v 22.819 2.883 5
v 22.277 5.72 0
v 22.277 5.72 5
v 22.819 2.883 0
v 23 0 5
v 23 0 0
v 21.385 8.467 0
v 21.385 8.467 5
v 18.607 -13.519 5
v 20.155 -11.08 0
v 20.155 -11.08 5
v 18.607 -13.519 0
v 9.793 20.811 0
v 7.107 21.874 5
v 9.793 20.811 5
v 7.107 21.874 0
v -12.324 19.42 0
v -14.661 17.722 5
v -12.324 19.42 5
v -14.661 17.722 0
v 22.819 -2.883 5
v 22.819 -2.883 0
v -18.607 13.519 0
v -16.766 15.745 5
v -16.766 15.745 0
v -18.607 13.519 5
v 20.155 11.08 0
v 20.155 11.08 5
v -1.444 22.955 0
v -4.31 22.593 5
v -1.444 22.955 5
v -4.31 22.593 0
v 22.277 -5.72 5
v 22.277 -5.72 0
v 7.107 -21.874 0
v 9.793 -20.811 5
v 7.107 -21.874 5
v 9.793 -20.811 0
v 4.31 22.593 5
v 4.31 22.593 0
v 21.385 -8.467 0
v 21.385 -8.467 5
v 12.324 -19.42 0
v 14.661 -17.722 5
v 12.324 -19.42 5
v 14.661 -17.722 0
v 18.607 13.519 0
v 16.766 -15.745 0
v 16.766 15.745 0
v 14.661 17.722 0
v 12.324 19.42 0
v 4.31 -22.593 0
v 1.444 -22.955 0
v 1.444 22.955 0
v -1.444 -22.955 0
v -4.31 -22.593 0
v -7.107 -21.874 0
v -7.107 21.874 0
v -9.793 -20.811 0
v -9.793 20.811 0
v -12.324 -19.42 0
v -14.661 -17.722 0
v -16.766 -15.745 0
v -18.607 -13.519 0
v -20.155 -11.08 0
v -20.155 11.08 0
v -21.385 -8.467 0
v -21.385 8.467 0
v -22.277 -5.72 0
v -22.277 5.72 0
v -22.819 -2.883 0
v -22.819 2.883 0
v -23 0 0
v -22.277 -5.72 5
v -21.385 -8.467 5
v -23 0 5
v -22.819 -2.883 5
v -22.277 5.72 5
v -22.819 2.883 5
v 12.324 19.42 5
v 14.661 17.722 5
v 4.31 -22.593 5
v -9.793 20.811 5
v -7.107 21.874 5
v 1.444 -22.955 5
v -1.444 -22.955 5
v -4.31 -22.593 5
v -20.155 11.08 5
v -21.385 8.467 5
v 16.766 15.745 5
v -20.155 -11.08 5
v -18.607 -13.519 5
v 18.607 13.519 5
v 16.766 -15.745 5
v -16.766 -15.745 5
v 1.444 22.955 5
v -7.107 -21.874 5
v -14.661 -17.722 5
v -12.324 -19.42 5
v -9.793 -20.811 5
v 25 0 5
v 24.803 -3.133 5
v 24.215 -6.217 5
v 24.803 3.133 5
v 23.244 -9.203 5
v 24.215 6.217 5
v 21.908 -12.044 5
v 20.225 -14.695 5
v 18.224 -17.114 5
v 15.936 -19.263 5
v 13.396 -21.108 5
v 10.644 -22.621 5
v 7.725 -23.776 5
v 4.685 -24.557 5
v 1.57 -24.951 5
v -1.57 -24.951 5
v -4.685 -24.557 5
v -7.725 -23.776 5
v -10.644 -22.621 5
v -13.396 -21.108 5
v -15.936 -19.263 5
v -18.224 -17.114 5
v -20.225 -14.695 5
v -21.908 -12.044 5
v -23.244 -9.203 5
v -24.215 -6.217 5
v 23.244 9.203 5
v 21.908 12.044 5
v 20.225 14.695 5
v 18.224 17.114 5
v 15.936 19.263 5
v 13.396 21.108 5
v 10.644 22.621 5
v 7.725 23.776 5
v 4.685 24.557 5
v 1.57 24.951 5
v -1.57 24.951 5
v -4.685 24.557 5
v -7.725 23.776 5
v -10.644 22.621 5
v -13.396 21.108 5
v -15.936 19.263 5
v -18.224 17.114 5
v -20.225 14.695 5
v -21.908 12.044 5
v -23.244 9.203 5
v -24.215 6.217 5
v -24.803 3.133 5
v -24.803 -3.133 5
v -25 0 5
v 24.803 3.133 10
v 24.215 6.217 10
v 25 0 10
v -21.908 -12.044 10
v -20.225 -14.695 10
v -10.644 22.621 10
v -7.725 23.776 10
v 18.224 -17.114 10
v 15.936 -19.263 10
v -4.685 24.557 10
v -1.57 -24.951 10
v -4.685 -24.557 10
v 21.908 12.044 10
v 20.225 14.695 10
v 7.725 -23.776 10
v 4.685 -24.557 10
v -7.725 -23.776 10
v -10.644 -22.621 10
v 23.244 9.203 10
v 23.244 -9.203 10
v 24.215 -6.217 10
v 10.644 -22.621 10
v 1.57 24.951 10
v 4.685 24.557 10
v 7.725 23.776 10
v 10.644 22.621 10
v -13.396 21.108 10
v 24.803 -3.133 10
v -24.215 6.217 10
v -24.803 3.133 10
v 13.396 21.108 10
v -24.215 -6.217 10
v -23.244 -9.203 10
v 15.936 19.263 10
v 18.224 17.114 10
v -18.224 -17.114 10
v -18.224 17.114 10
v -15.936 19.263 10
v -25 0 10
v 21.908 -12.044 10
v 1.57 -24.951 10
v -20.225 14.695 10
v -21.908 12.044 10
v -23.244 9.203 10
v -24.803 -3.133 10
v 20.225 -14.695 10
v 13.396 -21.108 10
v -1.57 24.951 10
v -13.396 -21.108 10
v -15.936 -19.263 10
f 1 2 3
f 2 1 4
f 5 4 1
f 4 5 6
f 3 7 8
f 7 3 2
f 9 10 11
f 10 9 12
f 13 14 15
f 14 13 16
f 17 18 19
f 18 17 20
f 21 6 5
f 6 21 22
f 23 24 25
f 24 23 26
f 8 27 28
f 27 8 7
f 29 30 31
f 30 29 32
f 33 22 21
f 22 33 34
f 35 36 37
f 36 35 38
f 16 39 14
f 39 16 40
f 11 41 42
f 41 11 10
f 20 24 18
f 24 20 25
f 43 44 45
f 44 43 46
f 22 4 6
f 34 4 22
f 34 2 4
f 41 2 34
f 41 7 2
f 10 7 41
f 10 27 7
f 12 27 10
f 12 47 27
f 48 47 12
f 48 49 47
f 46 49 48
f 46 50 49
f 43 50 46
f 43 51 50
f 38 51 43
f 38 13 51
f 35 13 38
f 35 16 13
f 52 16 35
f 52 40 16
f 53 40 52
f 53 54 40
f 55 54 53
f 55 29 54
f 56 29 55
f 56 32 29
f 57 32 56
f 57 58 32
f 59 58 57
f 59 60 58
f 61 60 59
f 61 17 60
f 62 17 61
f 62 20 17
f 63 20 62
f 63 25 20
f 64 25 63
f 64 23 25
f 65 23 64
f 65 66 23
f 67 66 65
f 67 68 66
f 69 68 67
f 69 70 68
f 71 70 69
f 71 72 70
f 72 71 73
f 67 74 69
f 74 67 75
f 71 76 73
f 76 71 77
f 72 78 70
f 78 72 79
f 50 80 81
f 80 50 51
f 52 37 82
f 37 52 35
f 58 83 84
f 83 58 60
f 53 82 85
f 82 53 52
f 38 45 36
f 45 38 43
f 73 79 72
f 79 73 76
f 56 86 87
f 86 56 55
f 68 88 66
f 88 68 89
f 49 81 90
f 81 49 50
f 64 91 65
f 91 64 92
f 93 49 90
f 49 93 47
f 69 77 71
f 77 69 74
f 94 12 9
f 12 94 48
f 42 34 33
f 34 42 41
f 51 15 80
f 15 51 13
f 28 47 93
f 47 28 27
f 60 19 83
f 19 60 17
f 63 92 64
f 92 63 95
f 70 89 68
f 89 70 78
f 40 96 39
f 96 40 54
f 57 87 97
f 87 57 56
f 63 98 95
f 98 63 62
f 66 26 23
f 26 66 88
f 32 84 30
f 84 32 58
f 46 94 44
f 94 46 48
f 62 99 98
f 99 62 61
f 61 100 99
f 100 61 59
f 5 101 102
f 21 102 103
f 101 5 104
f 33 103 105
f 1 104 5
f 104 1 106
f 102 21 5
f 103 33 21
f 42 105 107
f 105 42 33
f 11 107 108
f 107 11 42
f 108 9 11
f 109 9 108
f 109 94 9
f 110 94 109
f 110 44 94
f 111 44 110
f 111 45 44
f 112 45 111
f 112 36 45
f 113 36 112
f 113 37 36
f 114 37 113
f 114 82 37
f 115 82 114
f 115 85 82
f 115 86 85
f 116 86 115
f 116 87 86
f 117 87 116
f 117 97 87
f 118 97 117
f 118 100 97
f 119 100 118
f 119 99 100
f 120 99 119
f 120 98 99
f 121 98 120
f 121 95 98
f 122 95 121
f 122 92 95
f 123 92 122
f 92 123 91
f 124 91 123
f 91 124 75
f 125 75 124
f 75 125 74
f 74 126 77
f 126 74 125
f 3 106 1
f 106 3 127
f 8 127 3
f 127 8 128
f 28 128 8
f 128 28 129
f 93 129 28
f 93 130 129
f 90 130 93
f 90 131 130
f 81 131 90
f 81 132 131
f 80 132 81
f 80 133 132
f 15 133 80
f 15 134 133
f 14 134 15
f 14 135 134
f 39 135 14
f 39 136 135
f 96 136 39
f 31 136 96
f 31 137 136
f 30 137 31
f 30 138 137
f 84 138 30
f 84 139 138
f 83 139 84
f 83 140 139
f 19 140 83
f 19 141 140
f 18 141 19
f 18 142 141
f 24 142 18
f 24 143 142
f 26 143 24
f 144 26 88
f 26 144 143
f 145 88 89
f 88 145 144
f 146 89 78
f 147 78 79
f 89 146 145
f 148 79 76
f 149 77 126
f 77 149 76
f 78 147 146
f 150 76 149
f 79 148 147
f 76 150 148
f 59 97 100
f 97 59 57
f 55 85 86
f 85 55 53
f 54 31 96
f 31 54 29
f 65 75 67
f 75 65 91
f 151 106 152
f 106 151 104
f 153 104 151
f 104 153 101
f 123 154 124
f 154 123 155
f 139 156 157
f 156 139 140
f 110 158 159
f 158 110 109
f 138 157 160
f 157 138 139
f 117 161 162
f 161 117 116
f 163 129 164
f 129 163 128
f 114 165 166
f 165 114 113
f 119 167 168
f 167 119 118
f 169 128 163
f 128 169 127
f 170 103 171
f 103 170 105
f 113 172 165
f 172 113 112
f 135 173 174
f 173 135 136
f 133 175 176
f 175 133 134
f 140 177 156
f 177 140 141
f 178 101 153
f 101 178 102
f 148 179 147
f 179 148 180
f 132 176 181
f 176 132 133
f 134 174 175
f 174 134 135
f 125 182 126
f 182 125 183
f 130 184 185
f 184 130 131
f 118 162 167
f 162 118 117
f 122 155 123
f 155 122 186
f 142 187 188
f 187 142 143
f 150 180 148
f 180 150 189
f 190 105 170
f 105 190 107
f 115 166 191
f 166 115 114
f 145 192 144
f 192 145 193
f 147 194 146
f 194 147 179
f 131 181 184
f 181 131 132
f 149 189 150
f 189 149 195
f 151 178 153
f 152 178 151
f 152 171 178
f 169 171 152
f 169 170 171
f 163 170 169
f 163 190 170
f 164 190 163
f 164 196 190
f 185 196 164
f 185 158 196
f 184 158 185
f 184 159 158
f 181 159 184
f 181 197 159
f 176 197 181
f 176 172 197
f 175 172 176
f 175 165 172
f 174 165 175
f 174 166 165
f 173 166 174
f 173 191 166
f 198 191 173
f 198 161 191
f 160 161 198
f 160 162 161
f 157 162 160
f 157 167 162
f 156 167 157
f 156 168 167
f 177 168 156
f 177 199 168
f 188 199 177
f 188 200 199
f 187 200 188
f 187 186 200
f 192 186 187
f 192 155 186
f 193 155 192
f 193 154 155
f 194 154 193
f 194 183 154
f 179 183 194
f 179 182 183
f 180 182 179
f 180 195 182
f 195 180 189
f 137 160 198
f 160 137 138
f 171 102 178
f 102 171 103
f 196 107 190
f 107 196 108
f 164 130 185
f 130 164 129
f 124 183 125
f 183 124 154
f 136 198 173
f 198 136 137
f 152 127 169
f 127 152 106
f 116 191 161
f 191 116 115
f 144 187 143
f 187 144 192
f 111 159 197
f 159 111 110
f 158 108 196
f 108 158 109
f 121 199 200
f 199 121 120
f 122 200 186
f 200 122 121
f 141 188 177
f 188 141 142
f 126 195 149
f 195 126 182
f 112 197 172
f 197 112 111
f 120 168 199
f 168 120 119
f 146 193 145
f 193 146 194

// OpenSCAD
// file: _variables.scad
// Length of the lamp shade
LENGTH = 120;
// Outer diameter of the lamp in general
DIAMETER = 50;
// Material strength
RIM = 2;

$fn=50;

// Thickness of the heatsink copper material
HEATSINK_THICKNESS = 1;
// Source file (DXF) of the 2D profile of the heat sink
HEATSINK_SHAPE = "heatsink-shape.dxf";
// Material thickness of the shade
SHADE_THICKNESS = 2;
// CALCULATED: Inner diameter of the lamp shade
INNER_DIAMETER = DIAMETER - 2*SHADE_THICKNESS;

// Thickness (along the axis of the lamp) of the encoder dial
DIAL_THICKNESS = 10;
// Number of teeth on the encoder dial
DIAL_TEETH = 240;
// Depth of each tooth on the encoder dial
DIAL_TEETH_DEPTH = 1;
// CALCULATED: Angle between two neightbouring teeth on the encoder dial
DIAL_TEETH_ANGLE = 360/DIAL_TEETH;

// Source file of the 2D outline of the pcb
PCB_OUTLINE = "./../electronics-design/board-outline.dxf";
// Total thickness of all PCBs with components
PCB_THICKNESS = 10;

// Length (along axis of the lamp) of the "passive" end cap, outside the lamp shade
CAP_OUTER_LENGTH =  5;
// Length (along axis of the lamp) of the "passive" end cap, inside the lamp shade
CAP_INNER_LENGTH = 5;

// Diameter of the hole that the power jack needs in order to protrude through the case
JACK_DRILL_DIAMETER = 5;
// Maximum diameter of that part of the power jack that will be inside the lamp casing
JACK_MAX_DIAMETER = 7;
// Length of that part of the power jack that will be inside the lamp casing
JACK_INNER_LENGTH = 2;
// main file
include <_variables.scad>;


module cap(outer_length = CAP_OUTER_LENGTH)
{
	difference() {
		union() {
			cylinder(d = INNER_DIAMETER, h = CAP_INNER_LENGTH);
			translate([0, 0, CAP_INNER_LENGTH])
				cylinder(d = DIAMETER, h = outer_length);
		}
		linear_extrude(height = CAP_INNER_LENGTH)
			import(file = HEATSINK_SHAPE);
	}
}

cap();
